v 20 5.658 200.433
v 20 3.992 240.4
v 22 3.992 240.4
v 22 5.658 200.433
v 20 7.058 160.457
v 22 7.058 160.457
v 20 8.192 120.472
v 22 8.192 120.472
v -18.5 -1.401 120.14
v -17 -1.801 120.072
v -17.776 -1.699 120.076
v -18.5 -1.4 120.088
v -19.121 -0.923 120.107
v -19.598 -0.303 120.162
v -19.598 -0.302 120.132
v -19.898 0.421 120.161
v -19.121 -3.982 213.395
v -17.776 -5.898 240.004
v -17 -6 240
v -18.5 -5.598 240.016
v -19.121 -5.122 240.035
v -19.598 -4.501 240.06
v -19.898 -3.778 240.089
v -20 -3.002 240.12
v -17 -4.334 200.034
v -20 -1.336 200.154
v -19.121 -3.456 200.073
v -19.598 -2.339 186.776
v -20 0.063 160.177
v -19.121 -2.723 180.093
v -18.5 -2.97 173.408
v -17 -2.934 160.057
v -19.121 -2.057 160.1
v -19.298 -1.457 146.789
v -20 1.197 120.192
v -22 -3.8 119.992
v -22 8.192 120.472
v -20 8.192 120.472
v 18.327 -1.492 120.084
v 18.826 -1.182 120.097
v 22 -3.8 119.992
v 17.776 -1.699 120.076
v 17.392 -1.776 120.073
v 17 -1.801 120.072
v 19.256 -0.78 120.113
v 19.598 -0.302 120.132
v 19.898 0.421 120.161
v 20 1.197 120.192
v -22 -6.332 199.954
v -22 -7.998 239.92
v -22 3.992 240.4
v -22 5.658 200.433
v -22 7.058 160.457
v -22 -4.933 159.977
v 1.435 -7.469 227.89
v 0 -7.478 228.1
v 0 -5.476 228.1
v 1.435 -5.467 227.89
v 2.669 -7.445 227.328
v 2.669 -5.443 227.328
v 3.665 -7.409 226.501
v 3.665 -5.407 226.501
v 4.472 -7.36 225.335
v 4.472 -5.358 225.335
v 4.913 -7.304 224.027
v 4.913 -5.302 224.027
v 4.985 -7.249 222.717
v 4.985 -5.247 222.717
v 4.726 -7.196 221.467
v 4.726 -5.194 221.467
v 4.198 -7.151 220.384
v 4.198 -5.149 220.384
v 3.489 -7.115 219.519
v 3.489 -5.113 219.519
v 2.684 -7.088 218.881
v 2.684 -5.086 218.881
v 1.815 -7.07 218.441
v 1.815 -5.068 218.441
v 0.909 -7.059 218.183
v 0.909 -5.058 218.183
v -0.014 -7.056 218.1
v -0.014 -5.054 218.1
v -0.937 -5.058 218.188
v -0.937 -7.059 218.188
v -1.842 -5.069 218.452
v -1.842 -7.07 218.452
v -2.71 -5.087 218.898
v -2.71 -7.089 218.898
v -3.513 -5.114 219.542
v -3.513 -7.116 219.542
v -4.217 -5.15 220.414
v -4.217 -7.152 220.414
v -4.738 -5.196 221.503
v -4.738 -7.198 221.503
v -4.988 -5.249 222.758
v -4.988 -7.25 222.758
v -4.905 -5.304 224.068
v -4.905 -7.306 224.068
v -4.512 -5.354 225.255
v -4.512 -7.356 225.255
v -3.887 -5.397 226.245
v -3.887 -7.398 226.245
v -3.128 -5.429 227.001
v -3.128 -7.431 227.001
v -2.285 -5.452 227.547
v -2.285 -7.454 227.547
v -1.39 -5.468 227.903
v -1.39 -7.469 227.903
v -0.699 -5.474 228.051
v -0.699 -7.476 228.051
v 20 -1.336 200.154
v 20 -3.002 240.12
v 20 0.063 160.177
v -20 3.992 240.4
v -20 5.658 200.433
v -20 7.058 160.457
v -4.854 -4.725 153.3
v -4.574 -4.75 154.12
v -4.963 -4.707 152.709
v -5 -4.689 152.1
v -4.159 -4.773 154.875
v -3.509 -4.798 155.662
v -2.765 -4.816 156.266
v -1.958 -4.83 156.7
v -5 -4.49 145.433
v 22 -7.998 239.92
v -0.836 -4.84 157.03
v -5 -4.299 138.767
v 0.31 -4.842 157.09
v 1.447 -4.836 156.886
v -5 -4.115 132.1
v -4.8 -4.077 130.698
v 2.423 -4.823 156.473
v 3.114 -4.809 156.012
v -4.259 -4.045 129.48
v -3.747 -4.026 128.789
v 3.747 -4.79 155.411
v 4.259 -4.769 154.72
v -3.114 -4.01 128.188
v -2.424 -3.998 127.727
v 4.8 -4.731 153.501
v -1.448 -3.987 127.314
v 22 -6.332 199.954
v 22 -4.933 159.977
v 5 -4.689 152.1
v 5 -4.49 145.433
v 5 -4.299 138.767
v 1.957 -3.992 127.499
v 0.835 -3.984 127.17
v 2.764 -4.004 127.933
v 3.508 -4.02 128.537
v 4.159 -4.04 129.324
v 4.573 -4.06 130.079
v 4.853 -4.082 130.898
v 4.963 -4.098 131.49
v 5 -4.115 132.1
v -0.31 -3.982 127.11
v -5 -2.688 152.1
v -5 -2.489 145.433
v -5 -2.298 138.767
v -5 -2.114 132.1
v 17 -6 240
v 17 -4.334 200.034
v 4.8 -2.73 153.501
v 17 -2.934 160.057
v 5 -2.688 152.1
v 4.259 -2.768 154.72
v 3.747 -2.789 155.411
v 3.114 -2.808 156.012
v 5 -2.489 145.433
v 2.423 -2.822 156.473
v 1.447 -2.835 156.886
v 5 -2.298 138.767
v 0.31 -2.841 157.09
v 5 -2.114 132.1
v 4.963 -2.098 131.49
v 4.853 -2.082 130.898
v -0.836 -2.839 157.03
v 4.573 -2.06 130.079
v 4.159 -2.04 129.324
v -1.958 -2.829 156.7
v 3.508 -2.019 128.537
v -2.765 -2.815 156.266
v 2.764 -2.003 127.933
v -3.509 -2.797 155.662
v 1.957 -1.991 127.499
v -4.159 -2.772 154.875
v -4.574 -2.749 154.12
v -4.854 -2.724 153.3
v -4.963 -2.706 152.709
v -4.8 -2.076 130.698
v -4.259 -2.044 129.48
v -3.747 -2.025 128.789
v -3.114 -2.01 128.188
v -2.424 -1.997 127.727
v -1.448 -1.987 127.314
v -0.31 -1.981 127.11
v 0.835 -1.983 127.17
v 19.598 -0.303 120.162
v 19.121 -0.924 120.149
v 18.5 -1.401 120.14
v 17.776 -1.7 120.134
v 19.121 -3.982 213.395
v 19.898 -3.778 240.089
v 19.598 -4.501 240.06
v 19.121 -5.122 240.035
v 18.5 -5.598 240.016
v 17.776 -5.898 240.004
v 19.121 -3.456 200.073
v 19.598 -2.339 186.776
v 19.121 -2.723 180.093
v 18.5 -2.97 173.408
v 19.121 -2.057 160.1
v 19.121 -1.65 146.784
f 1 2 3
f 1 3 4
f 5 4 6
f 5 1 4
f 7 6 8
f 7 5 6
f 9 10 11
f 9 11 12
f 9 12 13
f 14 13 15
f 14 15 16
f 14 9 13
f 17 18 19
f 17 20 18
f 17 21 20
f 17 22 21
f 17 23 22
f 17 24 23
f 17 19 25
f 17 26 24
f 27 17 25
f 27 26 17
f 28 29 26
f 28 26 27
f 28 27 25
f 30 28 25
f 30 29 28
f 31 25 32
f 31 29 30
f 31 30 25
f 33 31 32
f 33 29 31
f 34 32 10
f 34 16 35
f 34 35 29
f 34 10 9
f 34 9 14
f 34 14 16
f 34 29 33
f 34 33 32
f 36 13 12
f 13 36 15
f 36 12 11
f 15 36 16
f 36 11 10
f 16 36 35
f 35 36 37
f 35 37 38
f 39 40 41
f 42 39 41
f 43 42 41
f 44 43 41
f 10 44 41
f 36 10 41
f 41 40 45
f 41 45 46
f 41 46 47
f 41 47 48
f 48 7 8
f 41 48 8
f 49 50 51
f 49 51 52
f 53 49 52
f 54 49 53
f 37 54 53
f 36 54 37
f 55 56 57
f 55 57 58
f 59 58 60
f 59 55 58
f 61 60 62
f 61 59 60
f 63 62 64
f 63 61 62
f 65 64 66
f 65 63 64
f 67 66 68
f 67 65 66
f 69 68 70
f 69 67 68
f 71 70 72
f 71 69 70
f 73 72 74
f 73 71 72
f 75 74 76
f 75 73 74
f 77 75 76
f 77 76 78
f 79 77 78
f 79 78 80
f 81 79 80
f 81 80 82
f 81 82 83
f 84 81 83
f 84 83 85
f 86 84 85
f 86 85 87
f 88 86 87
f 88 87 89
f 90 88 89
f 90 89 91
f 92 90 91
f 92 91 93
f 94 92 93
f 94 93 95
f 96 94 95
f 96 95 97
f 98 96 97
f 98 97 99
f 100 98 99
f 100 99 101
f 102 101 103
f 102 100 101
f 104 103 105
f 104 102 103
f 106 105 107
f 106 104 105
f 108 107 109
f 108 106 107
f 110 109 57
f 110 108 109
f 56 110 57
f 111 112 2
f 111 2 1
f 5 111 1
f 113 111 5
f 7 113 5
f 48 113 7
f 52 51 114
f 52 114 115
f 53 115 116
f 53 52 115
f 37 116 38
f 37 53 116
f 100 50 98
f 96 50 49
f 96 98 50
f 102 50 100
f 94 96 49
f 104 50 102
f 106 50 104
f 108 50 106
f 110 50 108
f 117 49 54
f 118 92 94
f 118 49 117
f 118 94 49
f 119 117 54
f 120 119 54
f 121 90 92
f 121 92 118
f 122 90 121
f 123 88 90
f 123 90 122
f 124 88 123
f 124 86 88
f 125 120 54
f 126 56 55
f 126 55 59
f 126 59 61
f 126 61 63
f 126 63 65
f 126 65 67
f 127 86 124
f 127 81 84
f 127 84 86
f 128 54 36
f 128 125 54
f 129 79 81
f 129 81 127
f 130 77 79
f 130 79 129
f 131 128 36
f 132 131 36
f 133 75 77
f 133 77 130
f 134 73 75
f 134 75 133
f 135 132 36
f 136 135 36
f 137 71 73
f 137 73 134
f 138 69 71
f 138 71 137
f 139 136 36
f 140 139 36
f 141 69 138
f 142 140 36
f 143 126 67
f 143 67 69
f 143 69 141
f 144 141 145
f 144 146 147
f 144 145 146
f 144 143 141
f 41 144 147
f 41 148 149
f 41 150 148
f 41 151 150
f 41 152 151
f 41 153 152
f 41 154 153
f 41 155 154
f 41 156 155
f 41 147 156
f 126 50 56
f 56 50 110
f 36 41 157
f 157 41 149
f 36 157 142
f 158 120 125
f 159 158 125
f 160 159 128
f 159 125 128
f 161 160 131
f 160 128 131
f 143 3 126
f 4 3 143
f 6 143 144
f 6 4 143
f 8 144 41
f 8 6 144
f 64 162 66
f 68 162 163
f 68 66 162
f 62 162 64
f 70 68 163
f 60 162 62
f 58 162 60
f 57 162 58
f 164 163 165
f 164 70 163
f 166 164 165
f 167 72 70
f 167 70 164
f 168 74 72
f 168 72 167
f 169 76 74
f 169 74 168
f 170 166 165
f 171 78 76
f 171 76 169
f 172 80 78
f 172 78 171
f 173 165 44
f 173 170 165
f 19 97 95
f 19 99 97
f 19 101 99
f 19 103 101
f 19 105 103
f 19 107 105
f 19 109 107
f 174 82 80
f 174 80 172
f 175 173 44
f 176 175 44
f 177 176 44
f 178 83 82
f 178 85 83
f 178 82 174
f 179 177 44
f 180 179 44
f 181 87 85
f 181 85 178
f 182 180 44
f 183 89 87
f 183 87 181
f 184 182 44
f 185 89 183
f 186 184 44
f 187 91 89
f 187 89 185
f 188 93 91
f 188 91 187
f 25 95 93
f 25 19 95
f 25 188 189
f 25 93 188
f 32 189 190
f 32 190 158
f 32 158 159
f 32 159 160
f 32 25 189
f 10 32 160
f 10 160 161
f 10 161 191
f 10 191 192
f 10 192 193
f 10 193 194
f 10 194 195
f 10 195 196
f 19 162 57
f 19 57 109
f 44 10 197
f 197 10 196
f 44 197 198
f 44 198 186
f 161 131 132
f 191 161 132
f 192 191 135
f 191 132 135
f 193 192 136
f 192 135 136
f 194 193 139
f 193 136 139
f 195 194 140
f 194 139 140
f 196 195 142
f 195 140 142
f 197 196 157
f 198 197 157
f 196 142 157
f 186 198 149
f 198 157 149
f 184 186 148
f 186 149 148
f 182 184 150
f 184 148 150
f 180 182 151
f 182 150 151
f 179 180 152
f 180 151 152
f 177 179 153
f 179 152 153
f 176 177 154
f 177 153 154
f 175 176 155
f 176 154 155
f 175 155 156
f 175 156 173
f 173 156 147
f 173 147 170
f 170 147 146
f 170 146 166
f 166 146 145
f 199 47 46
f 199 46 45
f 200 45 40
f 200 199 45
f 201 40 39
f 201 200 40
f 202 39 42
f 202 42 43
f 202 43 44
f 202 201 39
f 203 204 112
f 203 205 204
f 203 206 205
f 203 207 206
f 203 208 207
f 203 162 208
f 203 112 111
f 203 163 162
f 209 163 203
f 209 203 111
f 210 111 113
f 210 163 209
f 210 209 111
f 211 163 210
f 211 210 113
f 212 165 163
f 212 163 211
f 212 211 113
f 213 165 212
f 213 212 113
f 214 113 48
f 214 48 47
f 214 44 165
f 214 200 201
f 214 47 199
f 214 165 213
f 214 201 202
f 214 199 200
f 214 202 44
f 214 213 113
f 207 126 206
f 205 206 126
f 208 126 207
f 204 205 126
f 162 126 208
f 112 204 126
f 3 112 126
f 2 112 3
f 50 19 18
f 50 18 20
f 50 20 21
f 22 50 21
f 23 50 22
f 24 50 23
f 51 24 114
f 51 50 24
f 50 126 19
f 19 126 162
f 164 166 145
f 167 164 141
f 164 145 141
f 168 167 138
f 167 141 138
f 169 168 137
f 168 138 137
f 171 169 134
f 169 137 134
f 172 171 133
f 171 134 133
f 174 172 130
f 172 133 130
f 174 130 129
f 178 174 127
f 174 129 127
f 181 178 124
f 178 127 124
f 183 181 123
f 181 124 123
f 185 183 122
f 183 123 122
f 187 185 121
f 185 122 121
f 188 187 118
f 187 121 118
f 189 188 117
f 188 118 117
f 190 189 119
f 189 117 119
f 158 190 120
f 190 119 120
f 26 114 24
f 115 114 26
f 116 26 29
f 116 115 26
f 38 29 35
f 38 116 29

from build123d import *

# Parameters (mm, degrees)
VARIOUS_MOUNTING_POINTS_DEPTH      = 302.472328172
VARIOUS_MOUNTING_POINTS_DEPTH_BACK = 302.472328172
SKETCH4_R                          = 5
SKETCH5_W                          = 142.042704148
SKETCH5_H                          = 92.874075788
CUT_EXTRUDE1_DEPTH                 = 422.289527912


with BuildPart() as part:
    # Sweep1: sweep along a path in Sketch3
    with BuildLine(Plane(origin=(0, 0, 0), x_dir=(0, 0, -1), z_dir=(1, 0, 0))) as sweep1_path:
        ThreePointArc((-240, -6), (30, 0.074962051), (300, -6))
    # Sketch1 → Sweep1 (sweep)
    with BuildSketch(Plane.XY):
        with BuildLine():
            Line((-17, 0), (17, 0))
            ThreePointArc((17, 0), (19.121320344, 0.878679656), (20, 3))
            Line((20, 3), (20, 10))
            Line((20, 10), (22, 10))
            Line((22, 10), (22, -2))
            Line((22, -2), (-22, -2))
            Line((-22, -2), (-22, 10))
            Line((-22, 10), (-20, 10))
            Line((-20, 10), (-20, 3))
            ThreePointArc((-20, 3), (-19.121320344, 0.878679656), (-17, 0))
        make_face()
    sweep(path=sweep1_path.line)

    # Sketch4 → Various mounting points (cut, two sides: drawn at the far end of the back side and taken through both)
    with BuildSketch(Plane(origin=(0, 0, 0), x_dir=(1, 0, 0), z_dir=(0, 1, 0)).offset(-VARIOUS_MOUNTING_POINTS_DEPTH_BACK)):
        with Locations(Location((0, 197.900062461, 0), (0, 0, 270))):
            Circle(SKETCH4_R)
        with Locations(Location((0, -223.099937539, 0), (0, 0, 270))):
            Circle(SKETCH4_R)
        with BuildLine():
            Line((-5, 256.900062461), (-5, 276.900062461))
            ThreePointArc((-5, 276.900062461), (0, 281.900062461), (5, 276.900062461))
            Line((5, 276.900062461), (5, 256.900062461))
            ThreePointArc((5, 256.900062461), (0, 251.900062461), (-5, 256.900062461))
        make_face()
        with BuildLine():
            Line((-5, 87.900062461), (-5, 107.900062461))
            ThreePointArc((-5, 107.900062461), (0, 112.900062461), (5, 107.900062461))
            Line((5, 107.900062461), (5, 87.900062461))
            ThreePointArc((5, 87.900062461), (0, 82.900062461), (-5, 87.900062461))
        make_face()
        with BuildLine():
            Line((-5, 7.900062461), (-5, 27.900062461))
            ThreePointArc((-5, 27.900062461), (0, 32.900062461), (5, 27.900062461))
            Line((5, 27.900062461), (5, 7.900062461))
            ThreePointArc((5, 7.900062461), (0, 2.900062461), (-5, 7.900062461))
        make_face()
        with BuildLine():
            Line((-5, -72.099937539), (-5, -52.099937539))
            ThreePointArc((-5, -52.099937539), (0, -47.099937539), (5, -52.099937539))
            Line((5, -52.099937539), (5, -72.099937539))
            ThreePointArc((5, -72.099937539), (0, -77.099937539), (-5, -72.099937539))
        make_face()
        with BuildLine():
            Line((-5, -152.099937539), (-5, -132.099937539))
            ThreePointArc((-5, -132.099937539), (0, -127.099937539), (5, -132.099937539))
            Line((5, -132.099937539), (5, -152.099937539))
            ThreePointArc((5, -152.099937539), (0, -157.099937539), (-5, -152.099937539))
        make_face()
    extrude(amount=VARIOUS_MOUNTING_POINTS_DEPTH + VARIOUS_MOUNTING_POINTS_DEPTH_BACK, mode=Mode.SUBTRACT)

    # Sketch5 → Cut-Extrude1 (cut, through all)
    with BuildSketch(Plane(origin=(0, -4.799999233, 119.951980823), x_dir=(1, 0, 0), z_dir=(0, -0.039984006397440985, 0.9992003198720513))):
        with Locations((-10.646198733, -6.327716956)):
            Rectangle(SKETCH5_W, SKETCH5_H)
    extrude(amount=-CUT_EXTRUDE1_DEPTH, mode=Mode.SUBTRACT)


solid = part.part
